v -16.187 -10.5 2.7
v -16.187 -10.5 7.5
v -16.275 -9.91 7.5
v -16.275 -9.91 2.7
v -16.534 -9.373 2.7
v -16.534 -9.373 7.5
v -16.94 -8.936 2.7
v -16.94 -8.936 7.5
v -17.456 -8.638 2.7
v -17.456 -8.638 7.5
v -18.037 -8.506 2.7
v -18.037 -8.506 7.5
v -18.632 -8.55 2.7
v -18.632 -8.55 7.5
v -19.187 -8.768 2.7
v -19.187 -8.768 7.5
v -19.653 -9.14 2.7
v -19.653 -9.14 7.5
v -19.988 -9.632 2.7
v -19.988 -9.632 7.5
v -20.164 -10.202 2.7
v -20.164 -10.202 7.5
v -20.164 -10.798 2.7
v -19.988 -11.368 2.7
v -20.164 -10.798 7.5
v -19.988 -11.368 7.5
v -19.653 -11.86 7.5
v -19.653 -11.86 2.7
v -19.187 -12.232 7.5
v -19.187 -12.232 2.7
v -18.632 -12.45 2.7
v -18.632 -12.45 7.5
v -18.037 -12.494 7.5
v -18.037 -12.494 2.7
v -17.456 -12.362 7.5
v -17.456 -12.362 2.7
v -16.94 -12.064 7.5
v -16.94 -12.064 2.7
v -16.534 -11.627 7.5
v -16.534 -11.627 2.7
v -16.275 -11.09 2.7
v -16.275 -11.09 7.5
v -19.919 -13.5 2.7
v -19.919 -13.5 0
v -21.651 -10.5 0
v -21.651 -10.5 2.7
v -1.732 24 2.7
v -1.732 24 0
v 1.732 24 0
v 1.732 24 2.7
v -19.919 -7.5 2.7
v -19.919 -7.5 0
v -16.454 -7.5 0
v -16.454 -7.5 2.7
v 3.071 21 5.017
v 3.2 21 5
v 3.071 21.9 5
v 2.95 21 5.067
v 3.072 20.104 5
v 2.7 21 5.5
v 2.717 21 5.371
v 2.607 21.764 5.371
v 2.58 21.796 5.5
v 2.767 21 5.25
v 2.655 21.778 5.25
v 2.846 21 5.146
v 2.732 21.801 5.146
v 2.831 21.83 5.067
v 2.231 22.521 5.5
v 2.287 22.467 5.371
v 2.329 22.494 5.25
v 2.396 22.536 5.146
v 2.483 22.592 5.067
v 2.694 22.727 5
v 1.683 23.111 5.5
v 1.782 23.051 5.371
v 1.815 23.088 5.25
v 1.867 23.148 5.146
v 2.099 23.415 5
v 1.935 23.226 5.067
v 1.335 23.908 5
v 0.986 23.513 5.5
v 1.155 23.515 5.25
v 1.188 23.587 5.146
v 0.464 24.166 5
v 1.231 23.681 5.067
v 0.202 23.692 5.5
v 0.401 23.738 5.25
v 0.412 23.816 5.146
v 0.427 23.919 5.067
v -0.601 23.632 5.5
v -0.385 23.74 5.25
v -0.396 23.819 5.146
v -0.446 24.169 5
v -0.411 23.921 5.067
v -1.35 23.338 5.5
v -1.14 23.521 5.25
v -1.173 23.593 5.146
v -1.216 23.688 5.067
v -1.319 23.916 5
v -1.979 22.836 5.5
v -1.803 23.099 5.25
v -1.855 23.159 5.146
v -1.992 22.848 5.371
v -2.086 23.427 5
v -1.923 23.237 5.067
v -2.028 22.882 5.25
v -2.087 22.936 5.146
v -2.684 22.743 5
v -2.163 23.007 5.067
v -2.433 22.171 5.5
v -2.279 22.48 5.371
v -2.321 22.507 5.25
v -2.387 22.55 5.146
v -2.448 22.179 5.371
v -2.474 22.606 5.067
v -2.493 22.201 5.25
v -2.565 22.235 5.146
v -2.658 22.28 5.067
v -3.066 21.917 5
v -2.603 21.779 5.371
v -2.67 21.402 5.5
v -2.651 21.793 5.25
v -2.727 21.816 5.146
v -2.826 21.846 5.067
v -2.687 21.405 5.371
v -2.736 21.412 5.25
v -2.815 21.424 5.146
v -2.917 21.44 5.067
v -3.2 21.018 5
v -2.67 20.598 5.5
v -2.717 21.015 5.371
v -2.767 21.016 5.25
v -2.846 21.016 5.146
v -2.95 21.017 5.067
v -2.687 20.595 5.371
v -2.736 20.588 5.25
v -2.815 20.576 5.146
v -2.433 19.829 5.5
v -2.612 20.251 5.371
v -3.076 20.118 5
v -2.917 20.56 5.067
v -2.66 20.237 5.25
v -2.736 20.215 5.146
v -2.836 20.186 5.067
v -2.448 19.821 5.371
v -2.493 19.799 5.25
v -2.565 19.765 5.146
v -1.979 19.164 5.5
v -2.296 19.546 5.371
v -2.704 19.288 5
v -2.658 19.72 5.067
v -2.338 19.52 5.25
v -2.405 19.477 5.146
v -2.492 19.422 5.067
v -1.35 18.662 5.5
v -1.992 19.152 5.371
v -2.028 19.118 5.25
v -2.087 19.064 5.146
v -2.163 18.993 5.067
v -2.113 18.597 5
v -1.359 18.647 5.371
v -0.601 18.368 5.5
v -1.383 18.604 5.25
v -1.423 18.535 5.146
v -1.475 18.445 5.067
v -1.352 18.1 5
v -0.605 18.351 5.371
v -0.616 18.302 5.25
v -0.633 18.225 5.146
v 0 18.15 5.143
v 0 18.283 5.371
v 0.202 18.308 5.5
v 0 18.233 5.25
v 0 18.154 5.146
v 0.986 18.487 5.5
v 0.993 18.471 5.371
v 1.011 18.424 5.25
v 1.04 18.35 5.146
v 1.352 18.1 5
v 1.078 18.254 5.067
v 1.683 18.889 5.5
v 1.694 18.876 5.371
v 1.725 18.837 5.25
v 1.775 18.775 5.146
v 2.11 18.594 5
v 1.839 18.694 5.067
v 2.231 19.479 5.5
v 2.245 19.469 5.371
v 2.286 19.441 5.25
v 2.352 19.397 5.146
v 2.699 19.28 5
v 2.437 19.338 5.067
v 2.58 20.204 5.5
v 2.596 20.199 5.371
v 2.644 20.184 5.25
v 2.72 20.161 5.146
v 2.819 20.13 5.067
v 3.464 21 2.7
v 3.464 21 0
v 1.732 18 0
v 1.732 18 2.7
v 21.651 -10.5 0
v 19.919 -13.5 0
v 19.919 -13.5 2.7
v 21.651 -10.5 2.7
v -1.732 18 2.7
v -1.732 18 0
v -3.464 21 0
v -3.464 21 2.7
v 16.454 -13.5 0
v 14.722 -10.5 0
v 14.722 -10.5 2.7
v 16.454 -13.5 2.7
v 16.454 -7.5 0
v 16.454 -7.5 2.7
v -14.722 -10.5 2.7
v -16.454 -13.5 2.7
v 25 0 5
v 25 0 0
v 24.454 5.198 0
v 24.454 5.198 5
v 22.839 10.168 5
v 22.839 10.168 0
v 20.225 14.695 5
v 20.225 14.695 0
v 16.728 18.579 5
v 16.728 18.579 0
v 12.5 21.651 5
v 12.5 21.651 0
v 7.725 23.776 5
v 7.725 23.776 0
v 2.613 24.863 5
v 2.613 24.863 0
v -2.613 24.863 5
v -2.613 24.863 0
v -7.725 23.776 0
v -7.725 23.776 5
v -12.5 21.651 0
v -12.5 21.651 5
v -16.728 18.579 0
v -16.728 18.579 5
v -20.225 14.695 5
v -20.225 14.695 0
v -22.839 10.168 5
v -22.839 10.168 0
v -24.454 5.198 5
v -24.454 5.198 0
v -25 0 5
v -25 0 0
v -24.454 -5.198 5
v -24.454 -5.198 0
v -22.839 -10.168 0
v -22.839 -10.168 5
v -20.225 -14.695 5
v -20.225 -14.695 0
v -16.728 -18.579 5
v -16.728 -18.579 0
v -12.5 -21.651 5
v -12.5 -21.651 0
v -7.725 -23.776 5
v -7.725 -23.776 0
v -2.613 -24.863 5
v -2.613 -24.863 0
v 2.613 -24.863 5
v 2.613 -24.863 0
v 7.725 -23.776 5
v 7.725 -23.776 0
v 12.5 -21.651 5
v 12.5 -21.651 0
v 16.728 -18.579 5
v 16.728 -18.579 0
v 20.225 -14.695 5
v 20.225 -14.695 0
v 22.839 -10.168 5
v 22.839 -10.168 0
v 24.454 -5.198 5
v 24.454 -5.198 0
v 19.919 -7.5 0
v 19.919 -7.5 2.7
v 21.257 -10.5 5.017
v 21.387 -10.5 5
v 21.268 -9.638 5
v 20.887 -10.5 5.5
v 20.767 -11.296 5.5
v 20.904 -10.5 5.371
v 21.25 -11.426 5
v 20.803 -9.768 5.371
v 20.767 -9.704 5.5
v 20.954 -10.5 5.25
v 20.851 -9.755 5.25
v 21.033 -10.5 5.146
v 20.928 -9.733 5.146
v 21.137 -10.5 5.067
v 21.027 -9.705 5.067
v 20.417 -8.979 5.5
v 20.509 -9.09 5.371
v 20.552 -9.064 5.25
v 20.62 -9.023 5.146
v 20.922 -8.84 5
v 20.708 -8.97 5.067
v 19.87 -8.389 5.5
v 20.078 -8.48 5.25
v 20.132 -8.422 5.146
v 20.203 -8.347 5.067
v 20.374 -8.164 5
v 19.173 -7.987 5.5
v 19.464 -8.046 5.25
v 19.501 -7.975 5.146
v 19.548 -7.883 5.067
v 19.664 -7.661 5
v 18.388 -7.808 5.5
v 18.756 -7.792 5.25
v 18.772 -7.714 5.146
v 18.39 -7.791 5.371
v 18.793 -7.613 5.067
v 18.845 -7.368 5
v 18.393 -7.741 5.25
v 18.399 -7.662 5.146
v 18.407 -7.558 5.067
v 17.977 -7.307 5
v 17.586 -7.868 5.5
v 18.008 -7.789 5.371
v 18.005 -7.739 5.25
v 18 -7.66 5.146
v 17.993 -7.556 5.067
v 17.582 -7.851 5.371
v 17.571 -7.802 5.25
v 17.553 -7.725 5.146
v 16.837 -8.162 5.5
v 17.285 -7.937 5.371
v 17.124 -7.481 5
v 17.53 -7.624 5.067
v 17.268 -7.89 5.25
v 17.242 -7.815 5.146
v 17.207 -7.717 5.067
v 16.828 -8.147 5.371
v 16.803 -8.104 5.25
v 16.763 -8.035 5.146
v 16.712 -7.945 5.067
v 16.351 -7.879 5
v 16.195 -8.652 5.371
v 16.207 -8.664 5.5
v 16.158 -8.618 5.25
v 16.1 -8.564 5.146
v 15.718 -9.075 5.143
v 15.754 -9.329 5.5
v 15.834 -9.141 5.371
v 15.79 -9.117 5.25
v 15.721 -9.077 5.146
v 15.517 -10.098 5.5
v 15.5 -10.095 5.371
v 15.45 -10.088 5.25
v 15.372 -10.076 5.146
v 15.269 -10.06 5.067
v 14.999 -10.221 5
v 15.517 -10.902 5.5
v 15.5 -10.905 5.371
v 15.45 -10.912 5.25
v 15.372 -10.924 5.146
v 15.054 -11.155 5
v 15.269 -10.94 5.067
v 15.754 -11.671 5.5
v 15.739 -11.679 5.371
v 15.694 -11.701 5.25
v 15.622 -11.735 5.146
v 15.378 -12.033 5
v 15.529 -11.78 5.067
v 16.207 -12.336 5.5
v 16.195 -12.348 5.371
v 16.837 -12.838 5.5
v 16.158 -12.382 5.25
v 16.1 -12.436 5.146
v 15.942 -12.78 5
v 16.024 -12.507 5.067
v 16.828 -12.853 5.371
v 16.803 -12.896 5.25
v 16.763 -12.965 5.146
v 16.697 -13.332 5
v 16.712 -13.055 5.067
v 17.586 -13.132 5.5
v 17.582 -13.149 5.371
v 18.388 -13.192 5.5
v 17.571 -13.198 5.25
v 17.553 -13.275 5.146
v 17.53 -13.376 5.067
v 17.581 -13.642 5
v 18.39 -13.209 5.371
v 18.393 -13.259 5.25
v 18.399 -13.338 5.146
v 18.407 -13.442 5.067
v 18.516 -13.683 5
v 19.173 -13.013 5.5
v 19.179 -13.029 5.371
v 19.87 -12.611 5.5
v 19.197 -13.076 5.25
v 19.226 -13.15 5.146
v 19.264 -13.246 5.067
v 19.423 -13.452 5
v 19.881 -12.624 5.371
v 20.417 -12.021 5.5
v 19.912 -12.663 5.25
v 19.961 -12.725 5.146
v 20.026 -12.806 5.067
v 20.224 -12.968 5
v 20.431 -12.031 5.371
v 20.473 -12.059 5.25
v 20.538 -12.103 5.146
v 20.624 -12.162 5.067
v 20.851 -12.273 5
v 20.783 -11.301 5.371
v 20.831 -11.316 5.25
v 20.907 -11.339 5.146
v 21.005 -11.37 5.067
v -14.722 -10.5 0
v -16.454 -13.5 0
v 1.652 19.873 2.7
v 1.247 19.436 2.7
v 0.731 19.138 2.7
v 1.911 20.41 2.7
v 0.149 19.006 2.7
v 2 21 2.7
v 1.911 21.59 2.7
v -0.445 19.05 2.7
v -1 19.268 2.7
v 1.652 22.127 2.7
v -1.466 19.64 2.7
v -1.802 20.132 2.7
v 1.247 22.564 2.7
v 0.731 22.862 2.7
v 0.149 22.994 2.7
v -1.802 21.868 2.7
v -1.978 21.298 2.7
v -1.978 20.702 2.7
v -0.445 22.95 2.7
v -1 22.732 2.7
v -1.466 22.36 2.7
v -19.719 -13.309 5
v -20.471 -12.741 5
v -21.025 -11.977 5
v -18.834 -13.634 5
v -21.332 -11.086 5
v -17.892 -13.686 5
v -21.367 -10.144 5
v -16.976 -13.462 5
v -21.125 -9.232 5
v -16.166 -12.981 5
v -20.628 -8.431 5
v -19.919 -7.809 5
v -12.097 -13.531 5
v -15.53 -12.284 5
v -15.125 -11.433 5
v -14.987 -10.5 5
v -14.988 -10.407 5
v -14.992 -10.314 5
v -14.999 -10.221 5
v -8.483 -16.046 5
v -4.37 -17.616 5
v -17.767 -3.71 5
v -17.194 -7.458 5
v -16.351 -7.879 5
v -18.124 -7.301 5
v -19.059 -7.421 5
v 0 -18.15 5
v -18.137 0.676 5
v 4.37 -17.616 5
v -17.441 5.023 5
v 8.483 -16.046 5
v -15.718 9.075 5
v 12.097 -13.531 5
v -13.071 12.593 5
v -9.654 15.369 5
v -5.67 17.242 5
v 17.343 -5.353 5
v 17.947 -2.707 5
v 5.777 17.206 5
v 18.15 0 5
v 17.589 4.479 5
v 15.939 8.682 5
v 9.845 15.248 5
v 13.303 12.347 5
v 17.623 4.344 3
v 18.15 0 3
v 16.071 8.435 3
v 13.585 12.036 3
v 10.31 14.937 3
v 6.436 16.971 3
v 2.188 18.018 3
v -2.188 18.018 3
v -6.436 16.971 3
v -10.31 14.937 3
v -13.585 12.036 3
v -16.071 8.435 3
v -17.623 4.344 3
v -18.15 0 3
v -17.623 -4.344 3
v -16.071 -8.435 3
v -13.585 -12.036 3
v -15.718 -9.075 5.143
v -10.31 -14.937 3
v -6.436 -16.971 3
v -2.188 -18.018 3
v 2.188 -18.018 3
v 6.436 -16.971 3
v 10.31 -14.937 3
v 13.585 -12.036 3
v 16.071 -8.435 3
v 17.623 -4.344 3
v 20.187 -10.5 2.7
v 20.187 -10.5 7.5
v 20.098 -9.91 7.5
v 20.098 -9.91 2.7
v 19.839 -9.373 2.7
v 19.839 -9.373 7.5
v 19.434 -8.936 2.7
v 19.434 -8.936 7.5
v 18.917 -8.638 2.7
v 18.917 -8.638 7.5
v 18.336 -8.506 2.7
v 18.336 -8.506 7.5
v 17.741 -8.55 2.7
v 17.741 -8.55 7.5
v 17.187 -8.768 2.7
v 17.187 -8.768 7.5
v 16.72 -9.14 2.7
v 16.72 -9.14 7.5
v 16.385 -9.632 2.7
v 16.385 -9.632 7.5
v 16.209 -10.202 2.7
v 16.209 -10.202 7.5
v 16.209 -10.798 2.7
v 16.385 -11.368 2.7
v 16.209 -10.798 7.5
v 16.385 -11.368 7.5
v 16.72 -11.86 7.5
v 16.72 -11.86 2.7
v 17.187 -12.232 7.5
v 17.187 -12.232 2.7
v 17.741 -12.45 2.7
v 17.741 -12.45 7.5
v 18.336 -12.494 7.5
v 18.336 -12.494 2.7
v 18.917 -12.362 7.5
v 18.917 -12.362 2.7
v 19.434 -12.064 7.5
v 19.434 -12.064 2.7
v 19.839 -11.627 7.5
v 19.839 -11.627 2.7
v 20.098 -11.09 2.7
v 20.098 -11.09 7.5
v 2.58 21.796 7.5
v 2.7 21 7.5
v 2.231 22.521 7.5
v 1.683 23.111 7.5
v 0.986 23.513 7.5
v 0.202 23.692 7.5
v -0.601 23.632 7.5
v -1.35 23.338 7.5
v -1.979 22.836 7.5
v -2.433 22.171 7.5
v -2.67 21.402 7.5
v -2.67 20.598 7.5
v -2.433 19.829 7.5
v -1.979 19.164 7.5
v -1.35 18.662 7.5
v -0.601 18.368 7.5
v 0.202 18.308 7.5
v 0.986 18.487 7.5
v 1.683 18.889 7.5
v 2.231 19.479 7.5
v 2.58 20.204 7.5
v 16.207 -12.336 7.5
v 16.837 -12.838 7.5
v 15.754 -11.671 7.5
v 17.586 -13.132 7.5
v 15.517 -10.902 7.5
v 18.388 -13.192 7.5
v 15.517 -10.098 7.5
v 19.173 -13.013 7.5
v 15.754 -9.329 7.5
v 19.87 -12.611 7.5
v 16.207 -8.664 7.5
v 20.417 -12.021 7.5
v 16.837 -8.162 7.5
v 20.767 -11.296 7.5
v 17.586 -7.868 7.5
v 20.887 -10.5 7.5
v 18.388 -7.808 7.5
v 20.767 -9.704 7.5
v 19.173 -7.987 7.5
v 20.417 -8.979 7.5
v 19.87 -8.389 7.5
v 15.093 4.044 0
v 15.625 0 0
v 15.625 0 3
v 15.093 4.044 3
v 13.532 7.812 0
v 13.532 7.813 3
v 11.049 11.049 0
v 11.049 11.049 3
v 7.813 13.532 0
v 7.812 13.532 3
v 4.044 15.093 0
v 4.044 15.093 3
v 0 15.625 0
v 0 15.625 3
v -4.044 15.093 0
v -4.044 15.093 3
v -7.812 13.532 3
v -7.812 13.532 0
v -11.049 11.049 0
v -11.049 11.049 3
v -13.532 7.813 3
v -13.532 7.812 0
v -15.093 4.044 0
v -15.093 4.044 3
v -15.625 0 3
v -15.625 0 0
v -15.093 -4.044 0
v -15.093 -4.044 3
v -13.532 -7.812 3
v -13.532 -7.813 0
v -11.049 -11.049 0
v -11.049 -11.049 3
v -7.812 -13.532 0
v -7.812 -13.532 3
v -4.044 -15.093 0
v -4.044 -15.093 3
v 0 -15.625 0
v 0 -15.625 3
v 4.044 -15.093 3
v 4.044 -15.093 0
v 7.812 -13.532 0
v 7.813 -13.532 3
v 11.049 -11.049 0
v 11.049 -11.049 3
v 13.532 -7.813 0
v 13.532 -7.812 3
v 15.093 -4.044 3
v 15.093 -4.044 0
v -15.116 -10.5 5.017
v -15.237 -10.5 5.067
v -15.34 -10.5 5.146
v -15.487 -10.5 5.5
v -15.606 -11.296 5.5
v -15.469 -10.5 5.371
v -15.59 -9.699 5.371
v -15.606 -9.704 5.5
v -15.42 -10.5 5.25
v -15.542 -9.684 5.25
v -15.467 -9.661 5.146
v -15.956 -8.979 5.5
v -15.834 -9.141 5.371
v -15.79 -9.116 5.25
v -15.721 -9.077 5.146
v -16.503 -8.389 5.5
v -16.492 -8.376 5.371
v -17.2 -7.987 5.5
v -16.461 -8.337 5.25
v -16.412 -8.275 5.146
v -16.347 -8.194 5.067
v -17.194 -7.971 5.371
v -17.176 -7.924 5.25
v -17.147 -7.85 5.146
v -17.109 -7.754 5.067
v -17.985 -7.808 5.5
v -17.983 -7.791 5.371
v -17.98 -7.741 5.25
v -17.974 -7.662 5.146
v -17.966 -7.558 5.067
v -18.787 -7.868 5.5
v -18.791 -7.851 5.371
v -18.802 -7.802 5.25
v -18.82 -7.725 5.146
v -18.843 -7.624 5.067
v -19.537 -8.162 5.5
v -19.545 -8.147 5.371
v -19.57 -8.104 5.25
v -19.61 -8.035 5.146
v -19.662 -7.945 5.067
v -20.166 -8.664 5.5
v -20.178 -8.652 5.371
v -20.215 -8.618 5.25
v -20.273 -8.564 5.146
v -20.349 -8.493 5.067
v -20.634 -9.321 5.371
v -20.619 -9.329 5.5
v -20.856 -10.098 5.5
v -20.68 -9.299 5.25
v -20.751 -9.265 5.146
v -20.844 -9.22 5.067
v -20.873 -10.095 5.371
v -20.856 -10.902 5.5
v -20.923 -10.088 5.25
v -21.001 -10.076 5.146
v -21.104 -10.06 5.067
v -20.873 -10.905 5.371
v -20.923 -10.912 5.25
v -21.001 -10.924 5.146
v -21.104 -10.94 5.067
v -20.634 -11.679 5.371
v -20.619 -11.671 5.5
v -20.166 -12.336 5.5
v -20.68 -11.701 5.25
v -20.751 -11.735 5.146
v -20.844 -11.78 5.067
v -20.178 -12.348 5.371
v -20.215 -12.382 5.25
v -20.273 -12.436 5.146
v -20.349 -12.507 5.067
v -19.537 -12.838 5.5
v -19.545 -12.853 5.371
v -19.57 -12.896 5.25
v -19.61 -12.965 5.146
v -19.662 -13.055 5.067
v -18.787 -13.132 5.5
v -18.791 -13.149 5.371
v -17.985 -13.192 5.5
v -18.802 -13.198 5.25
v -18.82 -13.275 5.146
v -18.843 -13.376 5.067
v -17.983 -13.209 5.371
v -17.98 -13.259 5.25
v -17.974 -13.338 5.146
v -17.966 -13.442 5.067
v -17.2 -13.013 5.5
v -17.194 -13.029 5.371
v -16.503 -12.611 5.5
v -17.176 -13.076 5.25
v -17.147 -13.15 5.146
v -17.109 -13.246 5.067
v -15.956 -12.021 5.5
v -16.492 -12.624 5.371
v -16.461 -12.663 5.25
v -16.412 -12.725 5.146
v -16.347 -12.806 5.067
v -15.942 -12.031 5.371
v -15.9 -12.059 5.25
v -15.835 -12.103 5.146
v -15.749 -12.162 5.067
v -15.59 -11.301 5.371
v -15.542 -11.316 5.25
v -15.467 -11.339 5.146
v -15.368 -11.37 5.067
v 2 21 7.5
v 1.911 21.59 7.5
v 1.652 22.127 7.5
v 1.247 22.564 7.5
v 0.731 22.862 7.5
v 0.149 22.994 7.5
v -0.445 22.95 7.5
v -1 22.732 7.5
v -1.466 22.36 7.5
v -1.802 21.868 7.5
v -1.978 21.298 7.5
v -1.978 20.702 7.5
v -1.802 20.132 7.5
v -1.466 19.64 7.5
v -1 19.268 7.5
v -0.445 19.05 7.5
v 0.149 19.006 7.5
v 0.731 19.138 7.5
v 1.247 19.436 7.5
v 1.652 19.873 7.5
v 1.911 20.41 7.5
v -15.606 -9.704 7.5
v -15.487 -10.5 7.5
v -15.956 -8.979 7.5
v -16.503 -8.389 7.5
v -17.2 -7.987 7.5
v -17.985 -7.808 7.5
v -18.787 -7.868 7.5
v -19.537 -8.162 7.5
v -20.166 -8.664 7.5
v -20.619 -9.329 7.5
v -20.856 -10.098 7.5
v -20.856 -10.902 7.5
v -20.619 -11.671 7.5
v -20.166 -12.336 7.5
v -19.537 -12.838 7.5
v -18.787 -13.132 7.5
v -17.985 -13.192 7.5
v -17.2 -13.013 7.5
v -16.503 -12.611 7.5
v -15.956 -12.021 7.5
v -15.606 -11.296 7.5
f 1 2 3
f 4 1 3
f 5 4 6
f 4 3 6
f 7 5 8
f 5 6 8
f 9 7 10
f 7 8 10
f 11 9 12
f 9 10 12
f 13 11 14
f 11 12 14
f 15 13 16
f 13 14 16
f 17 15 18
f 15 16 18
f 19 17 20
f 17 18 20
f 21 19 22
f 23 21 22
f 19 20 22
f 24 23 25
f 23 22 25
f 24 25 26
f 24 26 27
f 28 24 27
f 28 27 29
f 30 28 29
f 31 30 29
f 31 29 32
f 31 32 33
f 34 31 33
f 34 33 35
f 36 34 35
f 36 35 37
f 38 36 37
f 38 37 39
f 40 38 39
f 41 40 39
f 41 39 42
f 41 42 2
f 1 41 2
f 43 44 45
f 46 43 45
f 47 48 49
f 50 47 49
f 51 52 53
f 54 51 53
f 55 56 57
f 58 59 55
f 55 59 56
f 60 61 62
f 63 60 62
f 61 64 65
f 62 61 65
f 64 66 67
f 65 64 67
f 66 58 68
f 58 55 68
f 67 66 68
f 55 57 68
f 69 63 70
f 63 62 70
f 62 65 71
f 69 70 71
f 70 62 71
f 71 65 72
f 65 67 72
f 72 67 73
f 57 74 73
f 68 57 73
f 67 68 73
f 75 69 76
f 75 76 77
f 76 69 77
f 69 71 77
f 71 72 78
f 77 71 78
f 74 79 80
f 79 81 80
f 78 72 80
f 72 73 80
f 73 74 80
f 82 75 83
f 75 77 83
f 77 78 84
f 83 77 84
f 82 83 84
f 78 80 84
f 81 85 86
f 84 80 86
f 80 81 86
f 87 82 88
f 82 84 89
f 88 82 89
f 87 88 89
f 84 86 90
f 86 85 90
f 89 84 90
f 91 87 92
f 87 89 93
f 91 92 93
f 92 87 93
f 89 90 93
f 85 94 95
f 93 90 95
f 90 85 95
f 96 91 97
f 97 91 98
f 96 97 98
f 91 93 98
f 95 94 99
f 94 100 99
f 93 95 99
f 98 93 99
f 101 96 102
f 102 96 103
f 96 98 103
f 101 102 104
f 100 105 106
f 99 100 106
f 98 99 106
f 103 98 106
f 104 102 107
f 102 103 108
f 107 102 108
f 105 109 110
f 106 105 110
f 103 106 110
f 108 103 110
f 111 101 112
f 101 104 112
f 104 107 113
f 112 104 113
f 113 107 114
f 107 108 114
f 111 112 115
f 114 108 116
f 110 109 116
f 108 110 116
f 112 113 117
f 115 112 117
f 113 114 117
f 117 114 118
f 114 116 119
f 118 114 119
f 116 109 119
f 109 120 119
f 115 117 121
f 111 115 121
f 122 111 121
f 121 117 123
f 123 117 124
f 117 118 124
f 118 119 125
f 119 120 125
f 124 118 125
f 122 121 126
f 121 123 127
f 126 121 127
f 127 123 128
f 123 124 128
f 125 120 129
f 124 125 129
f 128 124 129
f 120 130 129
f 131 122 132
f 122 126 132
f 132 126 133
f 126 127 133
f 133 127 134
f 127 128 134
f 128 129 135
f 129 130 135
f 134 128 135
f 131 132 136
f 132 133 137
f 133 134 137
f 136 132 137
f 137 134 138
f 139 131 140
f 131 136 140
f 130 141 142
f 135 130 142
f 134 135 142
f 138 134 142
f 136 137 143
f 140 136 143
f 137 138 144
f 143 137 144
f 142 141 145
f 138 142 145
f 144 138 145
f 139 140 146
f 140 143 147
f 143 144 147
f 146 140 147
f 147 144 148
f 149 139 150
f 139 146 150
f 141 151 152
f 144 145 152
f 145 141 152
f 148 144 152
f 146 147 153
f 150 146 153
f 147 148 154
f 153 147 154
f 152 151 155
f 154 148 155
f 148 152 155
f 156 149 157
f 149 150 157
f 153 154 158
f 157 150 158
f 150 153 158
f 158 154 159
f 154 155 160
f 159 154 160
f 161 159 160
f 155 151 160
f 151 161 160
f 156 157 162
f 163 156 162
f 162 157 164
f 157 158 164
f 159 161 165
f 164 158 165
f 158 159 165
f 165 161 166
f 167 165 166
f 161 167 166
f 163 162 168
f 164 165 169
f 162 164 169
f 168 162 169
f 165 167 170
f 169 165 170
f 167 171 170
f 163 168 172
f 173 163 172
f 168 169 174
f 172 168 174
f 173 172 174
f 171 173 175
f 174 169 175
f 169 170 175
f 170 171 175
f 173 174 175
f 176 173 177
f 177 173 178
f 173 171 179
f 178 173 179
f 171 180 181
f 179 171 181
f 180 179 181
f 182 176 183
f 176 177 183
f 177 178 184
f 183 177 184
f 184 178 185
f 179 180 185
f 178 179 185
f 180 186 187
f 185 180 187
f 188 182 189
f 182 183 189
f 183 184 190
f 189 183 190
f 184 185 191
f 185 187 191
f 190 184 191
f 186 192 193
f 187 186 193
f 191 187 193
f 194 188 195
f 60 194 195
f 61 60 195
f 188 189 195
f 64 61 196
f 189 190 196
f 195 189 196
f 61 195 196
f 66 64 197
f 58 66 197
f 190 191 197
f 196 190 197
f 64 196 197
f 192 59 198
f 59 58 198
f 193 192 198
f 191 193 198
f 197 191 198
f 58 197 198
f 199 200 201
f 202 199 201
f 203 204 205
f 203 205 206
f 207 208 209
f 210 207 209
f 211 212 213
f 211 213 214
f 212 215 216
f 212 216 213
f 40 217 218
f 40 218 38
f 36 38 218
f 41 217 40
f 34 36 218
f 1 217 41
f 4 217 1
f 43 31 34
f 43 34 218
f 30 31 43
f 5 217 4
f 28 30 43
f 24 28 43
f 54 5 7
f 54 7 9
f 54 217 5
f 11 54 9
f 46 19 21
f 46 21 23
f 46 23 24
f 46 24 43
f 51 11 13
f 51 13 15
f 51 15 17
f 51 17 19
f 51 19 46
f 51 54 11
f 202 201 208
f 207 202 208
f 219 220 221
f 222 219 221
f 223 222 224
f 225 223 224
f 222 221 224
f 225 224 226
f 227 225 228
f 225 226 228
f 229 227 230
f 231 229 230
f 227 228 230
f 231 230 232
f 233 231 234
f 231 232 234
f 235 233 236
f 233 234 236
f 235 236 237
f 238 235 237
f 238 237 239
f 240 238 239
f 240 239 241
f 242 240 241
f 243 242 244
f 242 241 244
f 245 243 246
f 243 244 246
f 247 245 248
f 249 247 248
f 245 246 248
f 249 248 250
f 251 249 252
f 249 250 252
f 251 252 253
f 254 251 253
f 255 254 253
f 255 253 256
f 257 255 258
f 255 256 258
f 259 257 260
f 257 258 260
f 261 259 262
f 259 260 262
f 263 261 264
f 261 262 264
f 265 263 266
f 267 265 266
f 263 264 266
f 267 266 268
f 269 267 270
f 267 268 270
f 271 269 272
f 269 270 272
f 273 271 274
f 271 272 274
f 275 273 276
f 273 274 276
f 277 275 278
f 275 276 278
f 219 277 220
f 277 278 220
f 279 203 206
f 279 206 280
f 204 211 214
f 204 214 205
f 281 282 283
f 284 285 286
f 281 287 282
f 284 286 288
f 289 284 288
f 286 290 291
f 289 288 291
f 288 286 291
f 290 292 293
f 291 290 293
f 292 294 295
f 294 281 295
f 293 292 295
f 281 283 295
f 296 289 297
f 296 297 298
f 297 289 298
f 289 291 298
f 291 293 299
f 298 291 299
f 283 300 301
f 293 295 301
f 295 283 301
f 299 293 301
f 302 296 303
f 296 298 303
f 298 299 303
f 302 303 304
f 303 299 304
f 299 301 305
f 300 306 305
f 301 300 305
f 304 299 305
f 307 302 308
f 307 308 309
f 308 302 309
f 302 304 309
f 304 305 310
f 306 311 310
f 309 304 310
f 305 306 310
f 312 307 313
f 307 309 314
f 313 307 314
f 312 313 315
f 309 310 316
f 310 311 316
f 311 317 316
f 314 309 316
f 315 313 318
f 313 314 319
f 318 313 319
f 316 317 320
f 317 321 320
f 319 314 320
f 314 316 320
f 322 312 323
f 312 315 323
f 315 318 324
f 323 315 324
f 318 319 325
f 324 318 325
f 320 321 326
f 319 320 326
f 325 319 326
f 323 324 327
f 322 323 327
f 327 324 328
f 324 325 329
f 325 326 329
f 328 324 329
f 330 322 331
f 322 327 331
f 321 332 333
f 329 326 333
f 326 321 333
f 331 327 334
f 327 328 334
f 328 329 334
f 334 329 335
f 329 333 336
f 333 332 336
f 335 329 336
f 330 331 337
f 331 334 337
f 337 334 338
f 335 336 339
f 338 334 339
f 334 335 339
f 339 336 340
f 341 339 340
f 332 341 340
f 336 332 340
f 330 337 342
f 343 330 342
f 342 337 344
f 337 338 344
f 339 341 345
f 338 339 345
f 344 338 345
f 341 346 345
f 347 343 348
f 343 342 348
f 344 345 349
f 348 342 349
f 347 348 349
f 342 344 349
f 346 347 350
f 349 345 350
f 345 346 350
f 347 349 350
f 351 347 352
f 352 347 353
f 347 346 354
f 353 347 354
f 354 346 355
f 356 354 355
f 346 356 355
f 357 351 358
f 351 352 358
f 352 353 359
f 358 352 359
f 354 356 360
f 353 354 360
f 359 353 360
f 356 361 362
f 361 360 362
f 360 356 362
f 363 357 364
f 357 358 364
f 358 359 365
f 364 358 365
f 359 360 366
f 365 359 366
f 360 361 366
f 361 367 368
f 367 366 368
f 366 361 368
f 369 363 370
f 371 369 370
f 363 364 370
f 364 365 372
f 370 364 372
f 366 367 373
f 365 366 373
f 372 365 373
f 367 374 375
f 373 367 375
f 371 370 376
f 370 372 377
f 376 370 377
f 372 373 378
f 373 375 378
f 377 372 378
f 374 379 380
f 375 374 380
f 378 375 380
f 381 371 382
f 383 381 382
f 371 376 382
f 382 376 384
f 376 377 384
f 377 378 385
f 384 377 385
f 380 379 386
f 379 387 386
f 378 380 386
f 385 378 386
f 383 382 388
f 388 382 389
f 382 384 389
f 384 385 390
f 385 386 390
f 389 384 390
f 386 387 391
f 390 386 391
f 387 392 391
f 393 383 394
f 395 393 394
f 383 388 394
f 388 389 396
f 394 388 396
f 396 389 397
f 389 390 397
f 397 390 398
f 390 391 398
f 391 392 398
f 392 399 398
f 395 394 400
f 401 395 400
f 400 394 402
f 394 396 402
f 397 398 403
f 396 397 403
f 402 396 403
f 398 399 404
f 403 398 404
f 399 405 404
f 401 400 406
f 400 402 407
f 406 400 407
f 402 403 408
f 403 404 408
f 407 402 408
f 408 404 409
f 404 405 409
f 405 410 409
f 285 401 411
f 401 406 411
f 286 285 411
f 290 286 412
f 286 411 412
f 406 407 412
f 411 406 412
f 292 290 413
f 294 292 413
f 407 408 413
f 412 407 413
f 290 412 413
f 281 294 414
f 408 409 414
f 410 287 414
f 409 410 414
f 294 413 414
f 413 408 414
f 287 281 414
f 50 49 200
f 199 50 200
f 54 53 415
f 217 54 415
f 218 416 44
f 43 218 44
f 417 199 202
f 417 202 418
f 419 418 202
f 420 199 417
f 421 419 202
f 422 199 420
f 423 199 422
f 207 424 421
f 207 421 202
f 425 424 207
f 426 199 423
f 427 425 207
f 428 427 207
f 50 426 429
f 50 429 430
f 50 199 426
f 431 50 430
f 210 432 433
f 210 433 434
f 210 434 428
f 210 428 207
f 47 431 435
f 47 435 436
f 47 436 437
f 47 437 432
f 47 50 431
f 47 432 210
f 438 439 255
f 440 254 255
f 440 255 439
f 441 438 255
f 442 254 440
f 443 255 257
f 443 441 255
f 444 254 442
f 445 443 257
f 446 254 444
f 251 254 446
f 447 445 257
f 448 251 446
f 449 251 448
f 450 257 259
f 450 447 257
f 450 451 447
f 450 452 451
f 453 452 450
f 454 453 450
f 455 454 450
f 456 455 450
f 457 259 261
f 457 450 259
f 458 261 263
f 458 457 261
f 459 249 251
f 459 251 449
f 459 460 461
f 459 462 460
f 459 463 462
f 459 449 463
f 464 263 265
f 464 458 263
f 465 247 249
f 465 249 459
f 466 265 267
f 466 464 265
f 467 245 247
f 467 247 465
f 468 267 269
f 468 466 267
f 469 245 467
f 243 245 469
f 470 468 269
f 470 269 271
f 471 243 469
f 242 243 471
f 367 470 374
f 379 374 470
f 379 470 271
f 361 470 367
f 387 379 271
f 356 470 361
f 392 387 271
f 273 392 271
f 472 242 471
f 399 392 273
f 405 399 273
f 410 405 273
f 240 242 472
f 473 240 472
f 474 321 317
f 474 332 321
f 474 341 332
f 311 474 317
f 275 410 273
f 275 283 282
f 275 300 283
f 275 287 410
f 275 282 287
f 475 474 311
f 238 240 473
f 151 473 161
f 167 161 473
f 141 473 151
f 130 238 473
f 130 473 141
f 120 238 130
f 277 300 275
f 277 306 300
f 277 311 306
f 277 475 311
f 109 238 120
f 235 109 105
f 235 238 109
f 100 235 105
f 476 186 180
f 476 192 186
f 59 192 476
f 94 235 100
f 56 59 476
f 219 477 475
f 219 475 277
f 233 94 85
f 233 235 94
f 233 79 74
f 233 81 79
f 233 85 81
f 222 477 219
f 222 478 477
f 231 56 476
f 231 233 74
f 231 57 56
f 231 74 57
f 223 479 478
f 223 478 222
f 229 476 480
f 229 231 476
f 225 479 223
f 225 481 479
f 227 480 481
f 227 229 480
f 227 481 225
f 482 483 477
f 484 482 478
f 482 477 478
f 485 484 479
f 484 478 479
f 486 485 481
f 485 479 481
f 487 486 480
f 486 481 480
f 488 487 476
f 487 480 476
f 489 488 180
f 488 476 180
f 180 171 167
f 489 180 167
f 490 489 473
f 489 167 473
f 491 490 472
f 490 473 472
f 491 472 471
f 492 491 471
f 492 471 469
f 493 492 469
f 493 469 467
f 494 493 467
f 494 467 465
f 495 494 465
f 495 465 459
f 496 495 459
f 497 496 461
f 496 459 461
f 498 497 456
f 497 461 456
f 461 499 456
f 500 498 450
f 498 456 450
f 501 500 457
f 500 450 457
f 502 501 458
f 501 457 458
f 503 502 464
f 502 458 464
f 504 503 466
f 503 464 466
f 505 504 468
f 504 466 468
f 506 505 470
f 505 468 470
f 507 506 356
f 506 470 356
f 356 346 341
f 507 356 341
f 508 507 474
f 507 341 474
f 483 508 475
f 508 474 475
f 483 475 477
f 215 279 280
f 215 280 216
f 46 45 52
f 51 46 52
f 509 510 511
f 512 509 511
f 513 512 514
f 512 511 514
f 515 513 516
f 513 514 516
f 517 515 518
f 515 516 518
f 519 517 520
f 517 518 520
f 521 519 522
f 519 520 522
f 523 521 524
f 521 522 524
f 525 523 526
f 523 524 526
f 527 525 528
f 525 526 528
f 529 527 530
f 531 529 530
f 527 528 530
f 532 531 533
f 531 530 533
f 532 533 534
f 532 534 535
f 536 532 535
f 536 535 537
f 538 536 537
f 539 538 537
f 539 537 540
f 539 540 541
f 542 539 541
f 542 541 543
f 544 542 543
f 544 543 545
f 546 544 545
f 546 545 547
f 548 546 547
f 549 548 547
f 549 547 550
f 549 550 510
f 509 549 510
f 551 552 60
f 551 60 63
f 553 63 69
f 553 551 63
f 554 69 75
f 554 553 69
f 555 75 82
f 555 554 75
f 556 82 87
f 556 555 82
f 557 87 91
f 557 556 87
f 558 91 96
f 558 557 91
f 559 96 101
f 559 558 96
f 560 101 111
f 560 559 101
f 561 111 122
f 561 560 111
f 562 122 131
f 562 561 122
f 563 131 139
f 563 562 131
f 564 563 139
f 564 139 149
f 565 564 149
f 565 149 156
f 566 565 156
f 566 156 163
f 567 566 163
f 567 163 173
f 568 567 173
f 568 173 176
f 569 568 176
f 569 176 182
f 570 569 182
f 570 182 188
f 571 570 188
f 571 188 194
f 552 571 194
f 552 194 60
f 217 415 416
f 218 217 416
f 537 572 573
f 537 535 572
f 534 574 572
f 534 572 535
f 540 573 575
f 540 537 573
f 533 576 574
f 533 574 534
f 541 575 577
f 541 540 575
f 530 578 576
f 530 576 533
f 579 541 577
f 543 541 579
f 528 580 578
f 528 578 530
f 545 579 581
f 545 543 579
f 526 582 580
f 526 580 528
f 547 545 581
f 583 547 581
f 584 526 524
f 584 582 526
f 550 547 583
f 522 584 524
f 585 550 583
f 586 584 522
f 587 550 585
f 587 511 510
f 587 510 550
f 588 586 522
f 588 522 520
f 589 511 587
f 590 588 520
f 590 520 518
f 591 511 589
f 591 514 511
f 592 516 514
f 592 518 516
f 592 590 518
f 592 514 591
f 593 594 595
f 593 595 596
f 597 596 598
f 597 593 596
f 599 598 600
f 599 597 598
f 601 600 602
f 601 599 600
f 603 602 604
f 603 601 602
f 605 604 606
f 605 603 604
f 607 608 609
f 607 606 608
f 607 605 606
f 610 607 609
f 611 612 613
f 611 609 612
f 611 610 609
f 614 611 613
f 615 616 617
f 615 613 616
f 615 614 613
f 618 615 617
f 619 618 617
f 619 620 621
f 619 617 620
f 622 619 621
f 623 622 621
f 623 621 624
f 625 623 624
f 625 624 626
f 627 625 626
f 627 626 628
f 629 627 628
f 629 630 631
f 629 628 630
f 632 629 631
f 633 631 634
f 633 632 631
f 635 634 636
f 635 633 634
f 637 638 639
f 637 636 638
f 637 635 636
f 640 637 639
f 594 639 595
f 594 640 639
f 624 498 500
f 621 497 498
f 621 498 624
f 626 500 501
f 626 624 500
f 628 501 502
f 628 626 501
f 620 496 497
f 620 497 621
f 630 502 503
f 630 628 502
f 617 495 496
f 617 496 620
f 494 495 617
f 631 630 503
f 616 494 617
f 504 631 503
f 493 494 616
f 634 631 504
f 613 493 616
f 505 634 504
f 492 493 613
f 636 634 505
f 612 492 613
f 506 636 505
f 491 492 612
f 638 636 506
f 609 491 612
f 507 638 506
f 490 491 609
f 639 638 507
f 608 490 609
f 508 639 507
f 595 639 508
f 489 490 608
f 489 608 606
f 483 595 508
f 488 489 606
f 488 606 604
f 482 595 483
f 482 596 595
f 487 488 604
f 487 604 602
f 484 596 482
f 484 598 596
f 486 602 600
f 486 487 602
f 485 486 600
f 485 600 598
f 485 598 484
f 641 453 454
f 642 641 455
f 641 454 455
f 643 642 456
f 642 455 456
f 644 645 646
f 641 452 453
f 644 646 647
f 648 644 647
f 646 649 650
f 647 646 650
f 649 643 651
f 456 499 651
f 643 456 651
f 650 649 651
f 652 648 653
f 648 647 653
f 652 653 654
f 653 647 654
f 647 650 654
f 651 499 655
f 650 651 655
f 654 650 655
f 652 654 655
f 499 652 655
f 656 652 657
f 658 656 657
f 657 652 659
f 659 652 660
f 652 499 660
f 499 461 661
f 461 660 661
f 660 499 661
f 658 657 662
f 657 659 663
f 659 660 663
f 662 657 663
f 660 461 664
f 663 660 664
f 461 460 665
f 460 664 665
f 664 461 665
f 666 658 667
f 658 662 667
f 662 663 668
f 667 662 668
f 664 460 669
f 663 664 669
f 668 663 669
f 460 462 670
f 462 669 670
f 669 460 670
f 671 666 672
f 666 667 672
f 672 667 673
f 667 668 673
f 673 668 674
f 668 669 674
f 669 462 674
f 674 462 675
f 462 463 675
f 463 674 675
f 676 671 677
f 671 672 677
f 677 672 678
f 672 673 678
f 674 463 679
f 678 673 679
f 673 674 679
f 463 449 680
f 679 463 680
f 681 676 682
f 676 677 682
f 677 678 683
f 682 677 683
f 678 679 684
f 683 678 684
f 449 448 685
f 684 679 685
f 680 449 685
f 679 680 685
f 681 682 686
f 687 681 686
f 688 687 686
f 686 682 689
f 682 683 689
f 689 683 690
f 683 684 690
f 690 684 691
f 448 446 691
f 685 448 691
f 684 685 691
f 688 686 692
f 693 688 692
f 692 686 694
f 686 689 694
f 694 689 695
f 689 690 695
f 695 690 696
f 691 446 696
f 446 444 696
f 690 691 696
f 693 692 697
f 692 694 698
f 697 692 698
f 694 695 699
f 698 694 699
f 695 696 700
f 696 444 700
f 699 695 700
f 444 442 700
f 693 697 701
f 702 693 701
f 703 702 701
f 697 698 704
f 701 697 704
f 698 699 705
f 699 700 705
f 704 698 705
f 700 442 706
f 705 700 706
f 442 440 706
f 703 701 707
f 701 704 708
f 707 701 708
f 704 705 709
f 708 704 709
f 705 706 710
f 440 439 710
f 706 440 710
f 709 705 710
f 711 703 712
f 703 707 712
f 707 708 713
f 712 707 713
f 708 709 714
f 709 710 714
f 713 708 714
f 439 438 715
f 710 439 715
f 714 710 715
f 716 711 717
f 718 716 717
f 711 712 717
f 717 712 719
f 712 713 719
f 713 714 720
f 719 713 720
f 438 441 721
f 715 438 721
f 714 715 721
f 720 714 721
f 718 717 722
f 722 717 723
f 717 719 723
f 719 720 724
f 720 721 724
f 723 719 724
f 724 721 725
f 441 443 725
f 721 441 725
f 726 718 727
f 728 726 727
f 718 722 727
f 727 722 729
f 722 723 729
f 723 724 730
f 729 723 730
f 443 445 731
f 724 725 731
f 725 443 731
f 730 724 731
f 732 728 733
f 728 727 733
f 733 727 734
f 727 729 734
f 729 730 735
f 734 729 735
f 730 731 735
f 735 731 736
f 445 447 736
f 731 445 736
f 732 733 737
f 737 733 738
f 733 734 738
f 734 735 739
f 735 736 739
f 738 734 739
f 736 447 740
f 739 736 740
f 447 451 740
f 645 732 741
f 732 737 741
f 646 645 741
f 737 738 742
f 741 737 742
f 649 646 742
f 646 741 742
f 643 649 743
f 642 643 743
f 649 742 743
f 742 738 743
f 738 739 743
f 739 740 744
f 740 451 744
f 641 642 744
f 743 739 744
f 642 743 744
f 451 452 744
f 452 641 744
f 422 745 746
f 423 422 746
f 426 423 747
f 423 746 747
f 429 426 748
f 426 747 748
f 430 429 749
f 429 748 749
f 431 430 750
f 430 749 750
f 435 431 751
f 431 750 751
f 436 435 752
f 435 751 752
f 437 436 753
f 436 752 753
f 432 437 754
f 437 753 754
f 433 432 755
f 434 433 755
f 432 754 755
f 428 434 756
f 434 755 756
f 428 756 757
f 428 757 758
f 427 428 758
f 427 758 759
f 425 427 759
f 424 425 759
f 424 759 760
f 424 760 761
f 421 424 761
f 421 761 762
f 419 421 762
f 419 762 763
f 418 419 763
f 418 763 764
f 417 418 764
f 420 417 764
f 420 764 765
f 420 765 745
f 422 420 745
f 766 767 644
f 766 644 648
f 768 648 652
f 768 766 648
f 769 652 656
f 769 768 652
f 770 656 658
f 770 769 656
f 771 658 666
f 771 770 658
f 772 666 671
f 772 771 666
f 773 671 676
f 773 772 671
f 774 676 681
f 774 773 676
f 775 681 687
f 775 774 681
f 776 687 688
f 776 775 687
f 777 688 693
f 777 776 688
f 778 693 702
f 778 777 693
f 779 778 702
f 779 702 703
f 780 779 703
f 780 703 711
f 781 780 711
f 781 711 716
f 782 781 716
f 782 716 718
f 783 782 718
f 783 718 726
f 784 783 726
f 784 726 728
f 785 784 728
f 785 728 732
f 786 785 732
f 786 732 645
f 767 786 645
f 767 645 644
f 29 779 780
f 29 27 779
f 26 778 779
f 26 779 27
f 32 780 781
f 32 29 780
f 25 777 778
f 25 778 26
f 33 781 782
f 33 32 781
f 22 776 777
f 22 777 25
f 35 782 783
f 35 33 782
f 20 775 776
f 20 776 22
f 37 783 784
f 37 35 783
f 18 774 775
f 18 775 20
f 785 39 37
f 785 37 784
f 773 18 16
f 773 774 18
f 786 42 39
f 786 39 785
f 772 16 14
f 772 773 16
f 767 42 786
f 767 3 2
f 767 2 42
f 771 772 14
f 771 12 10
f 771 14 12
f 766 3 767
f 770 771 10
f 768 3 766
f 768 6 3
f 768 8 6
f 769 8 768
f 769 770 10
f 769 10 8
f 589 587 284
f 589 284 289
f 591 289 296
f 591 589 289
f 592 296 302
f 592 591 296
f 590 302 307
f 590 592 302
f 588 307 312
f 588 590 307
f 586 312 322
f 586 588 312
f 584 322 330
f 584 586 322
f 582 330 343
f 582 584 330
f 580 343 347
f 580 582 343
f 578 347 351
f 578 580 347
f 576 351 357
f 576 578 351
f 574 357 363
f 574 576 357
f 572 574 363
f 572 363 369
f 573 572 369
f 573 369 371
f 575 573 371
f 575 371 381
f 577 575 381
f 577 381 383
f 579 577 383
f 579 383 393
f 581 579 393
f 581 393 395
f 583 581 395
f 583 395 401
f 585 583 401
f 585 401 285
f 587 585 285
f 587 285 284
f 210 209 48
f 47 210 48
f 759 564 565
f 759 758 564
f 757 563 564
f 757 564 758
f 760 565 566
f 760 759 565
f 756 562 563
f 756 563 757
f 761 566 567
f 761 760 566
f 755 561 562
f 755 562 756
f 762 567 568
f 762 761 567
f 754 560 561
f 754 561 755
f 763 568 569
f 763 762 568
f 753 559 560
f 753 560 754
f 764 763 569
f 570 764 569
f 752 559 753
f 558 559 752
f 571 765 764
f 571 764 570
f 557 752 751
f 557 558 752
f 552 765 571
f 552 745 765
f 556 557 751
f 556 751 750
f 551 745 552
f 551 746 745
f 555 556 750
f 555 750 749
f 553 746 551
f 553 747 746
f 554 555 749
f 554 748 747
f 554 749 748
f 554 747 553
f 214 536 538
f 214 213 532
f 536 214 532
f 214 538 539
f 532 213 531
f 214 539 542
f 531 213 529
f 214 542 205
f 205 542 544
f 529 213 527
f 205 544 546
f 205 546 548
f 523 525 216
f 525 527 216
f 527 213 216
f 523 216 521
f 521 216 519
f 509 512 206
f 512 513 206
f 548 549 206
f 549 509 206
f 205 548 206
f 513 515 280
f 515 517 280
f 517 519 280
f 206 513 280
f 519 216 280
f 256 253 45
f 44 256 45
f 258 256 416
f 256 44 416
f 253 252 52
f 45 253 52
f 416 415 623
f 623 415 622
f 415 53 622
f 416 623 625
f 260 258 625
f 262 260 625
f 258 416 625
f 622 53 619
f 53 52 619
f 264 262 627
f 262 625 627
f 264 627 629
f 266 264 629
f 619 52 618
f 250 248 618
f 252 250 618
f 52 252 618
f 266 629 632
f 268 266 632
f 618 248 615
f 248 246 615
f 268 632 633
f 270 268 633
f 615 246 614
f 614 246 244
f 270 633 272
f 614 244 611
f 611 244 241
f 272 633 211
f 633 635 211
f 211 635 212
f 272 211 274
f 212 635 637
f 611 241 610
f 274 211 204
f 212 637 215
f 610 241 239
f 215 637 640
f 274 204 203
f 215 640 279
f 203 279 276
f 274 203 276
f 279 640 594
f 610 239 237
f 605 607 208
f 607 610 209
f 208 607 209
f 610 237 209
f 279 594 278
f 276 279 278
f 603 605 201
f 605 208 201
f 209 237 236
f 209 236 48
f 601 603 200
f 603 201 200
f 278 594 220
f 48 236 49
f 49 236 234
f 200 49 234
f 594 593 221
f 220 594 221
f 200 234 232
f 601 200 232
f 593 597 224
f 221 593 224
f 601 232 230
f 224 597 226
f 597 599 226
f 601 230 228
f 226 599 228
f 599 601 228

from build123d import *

# Parameters (mm, degrees)
SKETCH1_R           = 25
SKETCH1_R_2         = 15.625
BOSS_EXTRUDE1_DEPTH = 5
SKETCH2_R           = 18.15
CUT_EXTRUDE1_DEPTH  = 2
SKETCH3_R           = 2
CUT_EXTRUDE2_DEPTH  = 5
CUT_EXTRUDE3_DEPTH  = 2.7
BOSS_EXTRUDE2_START = 2.5
SKETCH5_R           = 2.7
SKETCH5_R_2         = 2
BOSS_EXTRUDE2_DEPTH = 2.5
FILLET1_R           = 0.5
FILLET2_R           = 0.5
FILLET3_R           = 0.5


with BuildPart() as part:
    # Sketch1 → Boss-Extrude1 (new body)
    with BuildSketch(Plane.XY):
        Circle(SKETCH1_R)
        Circle(SKETCH1_R_2, mode=Mode.SUBTRACT)
    extrude(amount=BOSS_EXTRUDE1_DEPTH)

    # Sketch2 → Cut-Extrude1 (cut)
    with BuildSketch(Plane.XY.offset(5)):
        Circle(SKETCH2_R)
    extrude(amount=-CUT_EXTRUDE1_DEPTH, mode=Mode.SUBTRACT)

    # Sketch3 → Cut-Extrude2 (cut)
    with BuildSketch(Plane.XY.offset(5)):
        with Locations((0, 21)):
            Circle(SKETCH3_R)
        with Locations((-18.186533479, -10.5)):
            Circle(SKETCH3_R)
        with Locations((18.186533479, -10.5)):
            Circle(SKETCH3_R)
    extrude(amount=-CUT_EXTRUDE2_DEPTH, mode=Mode.SUBTRACT)

    # Sketch4 → Cut-Extrude3 (cut)
    with BuildSketch(Plane(origin=(0, 0, 0), x_dir=(-1, 0, 0), z_dir=(0, 0, -1))):
        Polygon((3.464101615, 21), (1.732050808, 24), (-1.732050808, 24), (-3.464101615, 21), (-1.732050808, 18), (1.732050808, 18), align=None)
        Polygon((-16.454482672, -13.5), (-19.918584287, -13.5), (-21.650635095, -10.5), (-19.918584287, -7.5), (-16.454482672, -7.5), (-14.722431864, -10.5), align=None)
        Polygon((19.918584287, -13.5), (21.650635095, -10.5), (19.918584287, -7.5), (16.454482672, -7.5), (14.722431864, -10.5), (16.454482672, -13.5), align=None)
    extrude(amount=-CUT_EXTRUDE3_DEPTH, mode=Mode.SUBTRACT)

    # Sketch5 → Boss-Extrude2 (add)
    # profile 1 of 3: a face of its own
    with BuildSketch(Plane.XY.offset(5).offset(BOSS_EXTRUDE2_START)):
        with Locations((0, 21)):
            Circle(SKETCH5_R)
        with Locations((0, 21)):
            Circle(SKETCH5_R_2, mode=Mode.SUBTRACT)
    # profile 2 of 3: a face of its own
    with BuildSketch(Plane.XY.offset(5).offset(BOSS_EXTRUDE2_START)):
        with Locations((-18.186533479, -10.5)):
            Circle(SKETCH5_R)
        with Locations((-18.186533479, -10.5)):
            Circle(SKETCH5_R_2, mode=Mode.SUBTRACT)
    # profile 3 of 3: a face of its own
    with BuildSketch(Plane.XY.offset(5).offset(BOSS_EXTRUDE2_START)):
        with Locations((18.186533479, -10.5)):
            Circle(SKETCH5_R)
        with Locations((18.186533479, -10.5)):
            Circle(SKETCH5_R_2, mode=Mode.SUBTRACT)
    extrude(amount=-BOSS_EXTRUDE2_DEPTH)

    # Fillet1
    # the kernel refuses this fillet: 0.5 mm, written as the material it adds along each edge
    with BuildSketch(Plane(origin=(-18.186533479, -10.5, 5), x_dir=(1, 0, 0), z_dir=(0, -1, 0))) as fillet1_piece_1_section:
        with BuildLine():
            CenterArc((2.7 + FILLET1_R, FILLET1_R), FILLET1_R, 180, 90)
            Line((2.7, FILLET1_R), (2.7, 0))
            Line((2.7, 0), (2.7 + FILLET1_R, 0))
        make_face()
    fillet1_piece_1 = revolve(axis=Axis((-18.186533479, -10.5, 5), (0, 0, 1)), mode=Mode.PRIVATE)
    fillet1_piece_1 = fillet1_piece_1 - Plane(origin=(0, 0, 5.139143481), x_dir=(1, 0, 0), z_dir=(0, 0, 1)) * Cylinder(18.15, 13, mode=Mode.PRIVATE)
    add(fillet1_piece_1)

    # Fillet2
    # the kernel refuses this fillet: 0.5 mm, written as the material it adds along each edge
    with BuildSketch(Plane(origin=(18.186533479, -10.5, 5), x_dir=(1, 0, 0), z_dir=(0, -1, 0))) as fillet2_piece_1_section:
        with BuildLine():
            CenterArc((2.7 + FILLET2_R, FILLET2_R), FILLET2_R, 180, 90)
            Line((2.7, FILLET2_R), (2.7, 0))
            Line((2.7, 0), (2.7 + FILLET2_R, 0))
        make_face()
    fillet2_piece_1 = revolve(axis=Axis((18.186533479, -10.5, 5), (0, 0, 1)), mode=Mode.PRIVATE)
    fillet2_piece_1 = fillet2_piece_1 - Plane(origin=(0, 0, 5.139143483), x_dir=(1, 0, 0), z_dir=(0, 0, 1)) * Cylinder(18.15, 13, mode=Mode.PRIVATE)
    add(fillet2_piece_1)

    # Fillet3
    # the kernel refuses this fillet: 0.5 mm, written as the material it adds along each edge
    with BuildSketch(Plane(origin=(0, 21, 5), x_dir=(1, 0, 0), z_dir=(0, -1, 0))) as fillet3_piece_1_section:
        with BuildLine():
            CenterArc((2.7 + FILLET3_R, FILLET3_R), FILLET3_R, 180, 90)
            Line((2.7, FILLET3_R), (2.7, 0))
            Line((2.7, 0), (2.7 + FILLET3_R, 0))
        make_face()
    fillet3_piece_1 = revolve(axis=Axis((0, 21, 5), (0, 0, 1)), mode=Mode.PRIVATE)
    fillet3_piece_1 = fillet3_piece_1 - Plane(origin=(0, 0, 5.139143484), x_dir=(1, 0, 0), z_dir=(0, 0, 1)) * Cylinder(18.15, 13, mode=Mode.PRIVATE)
    add(fillet3_piece_1)


solid = part.part
